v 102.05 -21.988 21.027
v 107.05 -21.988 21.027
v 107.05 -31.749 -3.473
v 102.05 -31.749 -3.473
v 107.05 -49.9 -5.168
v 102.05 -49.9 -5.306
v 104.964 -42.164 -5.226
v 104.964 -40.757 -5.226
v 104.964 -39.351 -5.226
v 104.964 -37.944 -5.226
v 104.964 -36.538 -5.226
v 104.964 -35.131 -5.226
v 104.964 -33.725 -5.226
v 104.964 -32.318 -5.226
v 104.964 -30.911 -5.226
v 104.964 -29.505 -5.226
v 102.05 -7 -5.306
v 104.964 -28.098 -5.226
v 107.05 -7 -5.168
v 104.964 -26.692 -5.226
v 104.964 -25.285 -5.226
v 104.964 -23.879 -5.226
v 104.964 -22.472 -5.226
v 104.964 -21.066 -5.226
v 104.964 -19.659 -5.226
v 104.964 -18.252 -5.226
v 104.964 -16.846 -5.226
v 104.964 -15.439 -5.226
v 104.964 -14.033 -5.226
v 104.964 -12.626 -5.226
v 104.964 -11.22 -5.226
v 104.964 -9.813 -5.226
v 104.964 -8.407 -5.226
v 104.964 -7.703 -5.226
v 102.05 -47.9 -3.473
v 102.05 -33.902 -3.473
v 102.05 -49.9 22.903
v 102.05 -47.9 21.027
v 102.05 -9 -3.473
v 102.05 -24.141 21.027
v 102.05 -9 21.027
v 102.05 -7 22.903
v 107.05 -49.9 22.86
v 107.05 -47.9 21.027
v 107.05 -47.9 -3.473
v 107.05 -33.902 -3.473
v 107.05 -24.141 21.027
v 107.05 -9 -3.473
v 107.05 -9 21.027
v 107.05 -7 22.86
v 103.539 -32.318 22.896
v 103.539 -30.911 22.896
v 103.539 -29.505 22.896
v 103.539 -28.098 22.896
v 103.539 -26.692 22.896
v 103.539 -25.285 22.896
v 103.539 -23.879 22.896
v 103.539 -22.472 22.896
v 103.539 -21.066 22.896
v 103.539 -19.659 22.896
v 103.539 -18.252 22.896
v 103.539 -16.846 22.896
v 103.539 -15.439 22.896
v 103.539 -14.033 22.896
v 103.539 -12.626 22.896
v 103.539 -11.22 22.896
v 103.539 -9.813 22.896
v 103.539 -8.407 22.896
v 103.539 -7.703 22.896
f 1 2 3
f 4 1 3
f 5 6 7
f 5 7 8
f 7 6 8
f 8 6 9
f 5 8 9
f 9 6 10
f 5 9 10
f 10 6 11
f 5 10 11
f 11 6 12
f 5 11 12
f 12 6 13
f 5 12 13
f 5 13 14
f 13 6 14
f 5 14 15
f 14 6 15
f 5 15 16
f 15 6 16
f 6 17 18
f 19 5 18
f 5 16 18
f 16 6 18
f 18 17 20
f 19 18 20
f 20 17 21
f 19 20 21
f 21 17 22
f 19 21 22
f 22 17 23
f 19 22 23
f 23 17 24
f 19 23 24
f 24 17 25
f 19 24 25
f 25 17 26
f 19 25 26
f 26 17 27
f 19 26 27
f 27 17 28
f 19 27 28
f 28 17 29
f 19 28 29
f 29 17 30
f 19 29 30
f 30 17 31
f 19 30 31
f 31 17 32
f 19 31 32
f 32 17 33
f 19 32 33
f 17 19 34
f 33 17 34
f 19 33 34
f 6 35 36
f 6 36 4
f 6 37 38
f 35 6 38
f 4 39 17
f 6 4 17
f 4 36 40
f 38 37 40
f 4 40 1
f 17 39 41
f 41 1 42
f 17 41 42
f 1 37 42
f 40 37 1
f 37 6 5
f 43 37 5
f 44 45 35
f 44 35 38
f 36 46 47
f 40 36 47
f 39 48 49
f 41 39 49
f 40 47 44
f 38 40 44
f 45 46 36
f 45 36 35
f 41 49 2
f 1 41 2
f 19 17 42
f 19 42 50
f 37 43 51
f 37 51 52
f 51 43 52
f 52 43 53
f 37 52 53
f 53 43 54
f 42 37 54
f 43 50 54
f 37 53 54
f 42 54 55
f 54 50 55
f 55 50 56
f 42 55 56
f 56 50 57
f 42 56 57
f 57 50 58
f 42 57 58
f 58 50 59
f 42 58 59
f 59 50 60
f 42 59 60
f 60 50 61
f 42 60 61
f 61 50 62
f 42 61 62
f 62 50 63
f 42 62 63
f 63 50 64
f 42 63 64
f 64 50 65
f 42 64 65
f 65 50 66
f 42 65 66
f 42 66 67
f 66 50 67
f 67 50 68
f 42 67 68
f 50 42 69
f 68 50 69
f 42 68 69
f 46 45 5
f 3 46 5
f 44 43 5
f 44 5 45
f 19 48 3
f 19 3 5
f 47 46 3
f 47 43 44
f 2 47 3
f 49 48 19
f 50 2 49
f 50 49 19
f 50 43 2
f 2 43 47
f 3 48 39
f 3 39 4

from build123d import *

# Parameters (mm, degrees)
PAD003_DEPTH    = 975
SKETCH013_W     = 310
SKETCH013_H     = 1100
SKETCH013_W_2   = 5
SKETCH013_H_2   = 42.9
POCKET007_DEPTH = 50
SKETCH014_W     = 24.5
SKETCH014_H     = 38.9
POCKET008_DEPTH = 5
PAD004_DEPTH    = 5


with BuildPart() as part:
    # Sketch012 → Pad003 (new body)
    with BuildSketch(Plane.XZ):
        with BuildLine():
            add(Edge.make_bspline(
                [(300, 0), (299.662763, 0.037038), (298.339429, 0.190429), (295.439956, 0.589667), (290.775356, 1.337839), (284.500044, 2.393262), (276.735212, 3.66473), (267.577355, 5.083019), (257.136483, 6.653879), (245.549215, 8.381993), (232.975291, 10.222771), (219.590016, 12.153256), (205.573823, 14.115503), (191.111579, 16.055183), (176.381713, 17.897983), (161.544489, 19.553409), (146.739309, 20.940939), (132.087536, 21.99009), (117.705275, 22.664279), (103.703346, 22.961168), (90.192549, 22.858072), (77.284675, 22.375726), (65.094168, 21.544938), (53.730431, 20.369385), (43.29002, 18.857963), (33.852484, 17.043697), (25.485501, 14.967735), (18.252292, 12.67281), (12.179436, 10.224412), (7.338355, 7.689021), (3.623023, 5.152403), (1.3546, 2.748114), (-0.314638, 0.590402), (0.575789, -1.804065), (3.482069, -2.72942), (7.386052, -3.91761), (13.030922, -4.754284), (20.096342, -5.463024), (28.645402, -5.933379), (38.56853, -6.201185), (49.790194, -6.284208), (62.196701, -6.193111), (75.660953, -5.967607), (90.034637, -5.629522), (105.153445, -5.226063), (120.83724, -4.775199), (136.895942, -4.296045), (153.13493, -3.818601), (169.356828, -3.345106), (185.36574, -2.889379), (200.968742, -2.465331), (215.974941, -2.074889), (230.201502, -1.715375), (243.47905, -1.394255), (255.639348, -1.103787), (266.558709, -0.84997), (276.034546, -0.603516), (284.209016, -0.340421), (290.324818, -0.117753), (295.956469, 0.021784), (297.365519, 0.017012), (300.344672, 0.018536), (300.000994, -0.000109), (300, 0)],
                knots=[0, 0, 0, 0, 1.017748, 3.99659, 8.779341, 15.189917, 23.087031, 32.383824, 42.990765, 54.76218, 67.530065, 81.114584, 95.333435, 109.988542, 124.889458, 139.866624, 154.774633, 169.496697, 183.930349, 197.964304, 211.506735, 224.45797, 236.709214, 248.156653, 258.723012, 268.346769, 276.97692, 284.567784, 291.102108, 296.573756, 300.992679, 304.39163, 306.761357, 308.43213, 311.131254, 315.298227, 320.951765, 328.080828, 336.654655, 346.609821, 357.866231, 370.316475, 383.83025, 398.264023, 413.449345, 429.202773, 445.334827, 461.646891, 477.940787, 494.021253, 509.693044, 524.767168, 539.054704, 552.387642, 564.607107, 575.560217, 585.109622, 593.180747, 599.700326, 604.53767, 607.540683, 608.560842, 608.563842, 608.563842, 608.563842, 608.563842], degree=3))
        make_face()
    extrude(amount=PAD003_DEPTH)

    # Sketch013 → Pocket007 (cut, symmetric)
    with BuildSketch(Plane.XY):
        with Locations((155, -550)):
            Rectangle(SKETCH013_W, SKETCH013_H)
        with Locations((104.55, -28.45)):
            Rectangle(SKETCH013_W_2, SKETCH013_H_2, mode=Mode.SUBTRACT)
    extrude(amount=POCKET007_DEPTH, both=True, mode=Mode.SUBTRACT)

    # Sketch014 (on Face3 of Pocket007) → Pocket008 (cut)
    with BuildSketch(Plane(origin=(107.05, 0, 0), x_dir=(0, 0, 1), z_dir=(1, 0, 0))):
        with Locations((8.777474, 28.45)):
            Rectangle(SKETCH014_W, SKETCH014_H)
    extrude(amount=-POCKET008_DEPTH, mode=Mode.SUBTRACT)

    # Sketch015 (on Face3 of Pocket008) → Pad004 (join)
    with BuildSketch(Plane(origin=(107.05, 0, 0), x_dir=(0, 0, 1), z_dir=(1, 0, 0))):
        Polygon((-4.239797, 34.207994), (22.004584, 23.751485), (22.004584, 21.598585), (-4.239797, 32.055093), align=None)
    extrude(amount=-PAD004_DEPTH)


solid = part.part
